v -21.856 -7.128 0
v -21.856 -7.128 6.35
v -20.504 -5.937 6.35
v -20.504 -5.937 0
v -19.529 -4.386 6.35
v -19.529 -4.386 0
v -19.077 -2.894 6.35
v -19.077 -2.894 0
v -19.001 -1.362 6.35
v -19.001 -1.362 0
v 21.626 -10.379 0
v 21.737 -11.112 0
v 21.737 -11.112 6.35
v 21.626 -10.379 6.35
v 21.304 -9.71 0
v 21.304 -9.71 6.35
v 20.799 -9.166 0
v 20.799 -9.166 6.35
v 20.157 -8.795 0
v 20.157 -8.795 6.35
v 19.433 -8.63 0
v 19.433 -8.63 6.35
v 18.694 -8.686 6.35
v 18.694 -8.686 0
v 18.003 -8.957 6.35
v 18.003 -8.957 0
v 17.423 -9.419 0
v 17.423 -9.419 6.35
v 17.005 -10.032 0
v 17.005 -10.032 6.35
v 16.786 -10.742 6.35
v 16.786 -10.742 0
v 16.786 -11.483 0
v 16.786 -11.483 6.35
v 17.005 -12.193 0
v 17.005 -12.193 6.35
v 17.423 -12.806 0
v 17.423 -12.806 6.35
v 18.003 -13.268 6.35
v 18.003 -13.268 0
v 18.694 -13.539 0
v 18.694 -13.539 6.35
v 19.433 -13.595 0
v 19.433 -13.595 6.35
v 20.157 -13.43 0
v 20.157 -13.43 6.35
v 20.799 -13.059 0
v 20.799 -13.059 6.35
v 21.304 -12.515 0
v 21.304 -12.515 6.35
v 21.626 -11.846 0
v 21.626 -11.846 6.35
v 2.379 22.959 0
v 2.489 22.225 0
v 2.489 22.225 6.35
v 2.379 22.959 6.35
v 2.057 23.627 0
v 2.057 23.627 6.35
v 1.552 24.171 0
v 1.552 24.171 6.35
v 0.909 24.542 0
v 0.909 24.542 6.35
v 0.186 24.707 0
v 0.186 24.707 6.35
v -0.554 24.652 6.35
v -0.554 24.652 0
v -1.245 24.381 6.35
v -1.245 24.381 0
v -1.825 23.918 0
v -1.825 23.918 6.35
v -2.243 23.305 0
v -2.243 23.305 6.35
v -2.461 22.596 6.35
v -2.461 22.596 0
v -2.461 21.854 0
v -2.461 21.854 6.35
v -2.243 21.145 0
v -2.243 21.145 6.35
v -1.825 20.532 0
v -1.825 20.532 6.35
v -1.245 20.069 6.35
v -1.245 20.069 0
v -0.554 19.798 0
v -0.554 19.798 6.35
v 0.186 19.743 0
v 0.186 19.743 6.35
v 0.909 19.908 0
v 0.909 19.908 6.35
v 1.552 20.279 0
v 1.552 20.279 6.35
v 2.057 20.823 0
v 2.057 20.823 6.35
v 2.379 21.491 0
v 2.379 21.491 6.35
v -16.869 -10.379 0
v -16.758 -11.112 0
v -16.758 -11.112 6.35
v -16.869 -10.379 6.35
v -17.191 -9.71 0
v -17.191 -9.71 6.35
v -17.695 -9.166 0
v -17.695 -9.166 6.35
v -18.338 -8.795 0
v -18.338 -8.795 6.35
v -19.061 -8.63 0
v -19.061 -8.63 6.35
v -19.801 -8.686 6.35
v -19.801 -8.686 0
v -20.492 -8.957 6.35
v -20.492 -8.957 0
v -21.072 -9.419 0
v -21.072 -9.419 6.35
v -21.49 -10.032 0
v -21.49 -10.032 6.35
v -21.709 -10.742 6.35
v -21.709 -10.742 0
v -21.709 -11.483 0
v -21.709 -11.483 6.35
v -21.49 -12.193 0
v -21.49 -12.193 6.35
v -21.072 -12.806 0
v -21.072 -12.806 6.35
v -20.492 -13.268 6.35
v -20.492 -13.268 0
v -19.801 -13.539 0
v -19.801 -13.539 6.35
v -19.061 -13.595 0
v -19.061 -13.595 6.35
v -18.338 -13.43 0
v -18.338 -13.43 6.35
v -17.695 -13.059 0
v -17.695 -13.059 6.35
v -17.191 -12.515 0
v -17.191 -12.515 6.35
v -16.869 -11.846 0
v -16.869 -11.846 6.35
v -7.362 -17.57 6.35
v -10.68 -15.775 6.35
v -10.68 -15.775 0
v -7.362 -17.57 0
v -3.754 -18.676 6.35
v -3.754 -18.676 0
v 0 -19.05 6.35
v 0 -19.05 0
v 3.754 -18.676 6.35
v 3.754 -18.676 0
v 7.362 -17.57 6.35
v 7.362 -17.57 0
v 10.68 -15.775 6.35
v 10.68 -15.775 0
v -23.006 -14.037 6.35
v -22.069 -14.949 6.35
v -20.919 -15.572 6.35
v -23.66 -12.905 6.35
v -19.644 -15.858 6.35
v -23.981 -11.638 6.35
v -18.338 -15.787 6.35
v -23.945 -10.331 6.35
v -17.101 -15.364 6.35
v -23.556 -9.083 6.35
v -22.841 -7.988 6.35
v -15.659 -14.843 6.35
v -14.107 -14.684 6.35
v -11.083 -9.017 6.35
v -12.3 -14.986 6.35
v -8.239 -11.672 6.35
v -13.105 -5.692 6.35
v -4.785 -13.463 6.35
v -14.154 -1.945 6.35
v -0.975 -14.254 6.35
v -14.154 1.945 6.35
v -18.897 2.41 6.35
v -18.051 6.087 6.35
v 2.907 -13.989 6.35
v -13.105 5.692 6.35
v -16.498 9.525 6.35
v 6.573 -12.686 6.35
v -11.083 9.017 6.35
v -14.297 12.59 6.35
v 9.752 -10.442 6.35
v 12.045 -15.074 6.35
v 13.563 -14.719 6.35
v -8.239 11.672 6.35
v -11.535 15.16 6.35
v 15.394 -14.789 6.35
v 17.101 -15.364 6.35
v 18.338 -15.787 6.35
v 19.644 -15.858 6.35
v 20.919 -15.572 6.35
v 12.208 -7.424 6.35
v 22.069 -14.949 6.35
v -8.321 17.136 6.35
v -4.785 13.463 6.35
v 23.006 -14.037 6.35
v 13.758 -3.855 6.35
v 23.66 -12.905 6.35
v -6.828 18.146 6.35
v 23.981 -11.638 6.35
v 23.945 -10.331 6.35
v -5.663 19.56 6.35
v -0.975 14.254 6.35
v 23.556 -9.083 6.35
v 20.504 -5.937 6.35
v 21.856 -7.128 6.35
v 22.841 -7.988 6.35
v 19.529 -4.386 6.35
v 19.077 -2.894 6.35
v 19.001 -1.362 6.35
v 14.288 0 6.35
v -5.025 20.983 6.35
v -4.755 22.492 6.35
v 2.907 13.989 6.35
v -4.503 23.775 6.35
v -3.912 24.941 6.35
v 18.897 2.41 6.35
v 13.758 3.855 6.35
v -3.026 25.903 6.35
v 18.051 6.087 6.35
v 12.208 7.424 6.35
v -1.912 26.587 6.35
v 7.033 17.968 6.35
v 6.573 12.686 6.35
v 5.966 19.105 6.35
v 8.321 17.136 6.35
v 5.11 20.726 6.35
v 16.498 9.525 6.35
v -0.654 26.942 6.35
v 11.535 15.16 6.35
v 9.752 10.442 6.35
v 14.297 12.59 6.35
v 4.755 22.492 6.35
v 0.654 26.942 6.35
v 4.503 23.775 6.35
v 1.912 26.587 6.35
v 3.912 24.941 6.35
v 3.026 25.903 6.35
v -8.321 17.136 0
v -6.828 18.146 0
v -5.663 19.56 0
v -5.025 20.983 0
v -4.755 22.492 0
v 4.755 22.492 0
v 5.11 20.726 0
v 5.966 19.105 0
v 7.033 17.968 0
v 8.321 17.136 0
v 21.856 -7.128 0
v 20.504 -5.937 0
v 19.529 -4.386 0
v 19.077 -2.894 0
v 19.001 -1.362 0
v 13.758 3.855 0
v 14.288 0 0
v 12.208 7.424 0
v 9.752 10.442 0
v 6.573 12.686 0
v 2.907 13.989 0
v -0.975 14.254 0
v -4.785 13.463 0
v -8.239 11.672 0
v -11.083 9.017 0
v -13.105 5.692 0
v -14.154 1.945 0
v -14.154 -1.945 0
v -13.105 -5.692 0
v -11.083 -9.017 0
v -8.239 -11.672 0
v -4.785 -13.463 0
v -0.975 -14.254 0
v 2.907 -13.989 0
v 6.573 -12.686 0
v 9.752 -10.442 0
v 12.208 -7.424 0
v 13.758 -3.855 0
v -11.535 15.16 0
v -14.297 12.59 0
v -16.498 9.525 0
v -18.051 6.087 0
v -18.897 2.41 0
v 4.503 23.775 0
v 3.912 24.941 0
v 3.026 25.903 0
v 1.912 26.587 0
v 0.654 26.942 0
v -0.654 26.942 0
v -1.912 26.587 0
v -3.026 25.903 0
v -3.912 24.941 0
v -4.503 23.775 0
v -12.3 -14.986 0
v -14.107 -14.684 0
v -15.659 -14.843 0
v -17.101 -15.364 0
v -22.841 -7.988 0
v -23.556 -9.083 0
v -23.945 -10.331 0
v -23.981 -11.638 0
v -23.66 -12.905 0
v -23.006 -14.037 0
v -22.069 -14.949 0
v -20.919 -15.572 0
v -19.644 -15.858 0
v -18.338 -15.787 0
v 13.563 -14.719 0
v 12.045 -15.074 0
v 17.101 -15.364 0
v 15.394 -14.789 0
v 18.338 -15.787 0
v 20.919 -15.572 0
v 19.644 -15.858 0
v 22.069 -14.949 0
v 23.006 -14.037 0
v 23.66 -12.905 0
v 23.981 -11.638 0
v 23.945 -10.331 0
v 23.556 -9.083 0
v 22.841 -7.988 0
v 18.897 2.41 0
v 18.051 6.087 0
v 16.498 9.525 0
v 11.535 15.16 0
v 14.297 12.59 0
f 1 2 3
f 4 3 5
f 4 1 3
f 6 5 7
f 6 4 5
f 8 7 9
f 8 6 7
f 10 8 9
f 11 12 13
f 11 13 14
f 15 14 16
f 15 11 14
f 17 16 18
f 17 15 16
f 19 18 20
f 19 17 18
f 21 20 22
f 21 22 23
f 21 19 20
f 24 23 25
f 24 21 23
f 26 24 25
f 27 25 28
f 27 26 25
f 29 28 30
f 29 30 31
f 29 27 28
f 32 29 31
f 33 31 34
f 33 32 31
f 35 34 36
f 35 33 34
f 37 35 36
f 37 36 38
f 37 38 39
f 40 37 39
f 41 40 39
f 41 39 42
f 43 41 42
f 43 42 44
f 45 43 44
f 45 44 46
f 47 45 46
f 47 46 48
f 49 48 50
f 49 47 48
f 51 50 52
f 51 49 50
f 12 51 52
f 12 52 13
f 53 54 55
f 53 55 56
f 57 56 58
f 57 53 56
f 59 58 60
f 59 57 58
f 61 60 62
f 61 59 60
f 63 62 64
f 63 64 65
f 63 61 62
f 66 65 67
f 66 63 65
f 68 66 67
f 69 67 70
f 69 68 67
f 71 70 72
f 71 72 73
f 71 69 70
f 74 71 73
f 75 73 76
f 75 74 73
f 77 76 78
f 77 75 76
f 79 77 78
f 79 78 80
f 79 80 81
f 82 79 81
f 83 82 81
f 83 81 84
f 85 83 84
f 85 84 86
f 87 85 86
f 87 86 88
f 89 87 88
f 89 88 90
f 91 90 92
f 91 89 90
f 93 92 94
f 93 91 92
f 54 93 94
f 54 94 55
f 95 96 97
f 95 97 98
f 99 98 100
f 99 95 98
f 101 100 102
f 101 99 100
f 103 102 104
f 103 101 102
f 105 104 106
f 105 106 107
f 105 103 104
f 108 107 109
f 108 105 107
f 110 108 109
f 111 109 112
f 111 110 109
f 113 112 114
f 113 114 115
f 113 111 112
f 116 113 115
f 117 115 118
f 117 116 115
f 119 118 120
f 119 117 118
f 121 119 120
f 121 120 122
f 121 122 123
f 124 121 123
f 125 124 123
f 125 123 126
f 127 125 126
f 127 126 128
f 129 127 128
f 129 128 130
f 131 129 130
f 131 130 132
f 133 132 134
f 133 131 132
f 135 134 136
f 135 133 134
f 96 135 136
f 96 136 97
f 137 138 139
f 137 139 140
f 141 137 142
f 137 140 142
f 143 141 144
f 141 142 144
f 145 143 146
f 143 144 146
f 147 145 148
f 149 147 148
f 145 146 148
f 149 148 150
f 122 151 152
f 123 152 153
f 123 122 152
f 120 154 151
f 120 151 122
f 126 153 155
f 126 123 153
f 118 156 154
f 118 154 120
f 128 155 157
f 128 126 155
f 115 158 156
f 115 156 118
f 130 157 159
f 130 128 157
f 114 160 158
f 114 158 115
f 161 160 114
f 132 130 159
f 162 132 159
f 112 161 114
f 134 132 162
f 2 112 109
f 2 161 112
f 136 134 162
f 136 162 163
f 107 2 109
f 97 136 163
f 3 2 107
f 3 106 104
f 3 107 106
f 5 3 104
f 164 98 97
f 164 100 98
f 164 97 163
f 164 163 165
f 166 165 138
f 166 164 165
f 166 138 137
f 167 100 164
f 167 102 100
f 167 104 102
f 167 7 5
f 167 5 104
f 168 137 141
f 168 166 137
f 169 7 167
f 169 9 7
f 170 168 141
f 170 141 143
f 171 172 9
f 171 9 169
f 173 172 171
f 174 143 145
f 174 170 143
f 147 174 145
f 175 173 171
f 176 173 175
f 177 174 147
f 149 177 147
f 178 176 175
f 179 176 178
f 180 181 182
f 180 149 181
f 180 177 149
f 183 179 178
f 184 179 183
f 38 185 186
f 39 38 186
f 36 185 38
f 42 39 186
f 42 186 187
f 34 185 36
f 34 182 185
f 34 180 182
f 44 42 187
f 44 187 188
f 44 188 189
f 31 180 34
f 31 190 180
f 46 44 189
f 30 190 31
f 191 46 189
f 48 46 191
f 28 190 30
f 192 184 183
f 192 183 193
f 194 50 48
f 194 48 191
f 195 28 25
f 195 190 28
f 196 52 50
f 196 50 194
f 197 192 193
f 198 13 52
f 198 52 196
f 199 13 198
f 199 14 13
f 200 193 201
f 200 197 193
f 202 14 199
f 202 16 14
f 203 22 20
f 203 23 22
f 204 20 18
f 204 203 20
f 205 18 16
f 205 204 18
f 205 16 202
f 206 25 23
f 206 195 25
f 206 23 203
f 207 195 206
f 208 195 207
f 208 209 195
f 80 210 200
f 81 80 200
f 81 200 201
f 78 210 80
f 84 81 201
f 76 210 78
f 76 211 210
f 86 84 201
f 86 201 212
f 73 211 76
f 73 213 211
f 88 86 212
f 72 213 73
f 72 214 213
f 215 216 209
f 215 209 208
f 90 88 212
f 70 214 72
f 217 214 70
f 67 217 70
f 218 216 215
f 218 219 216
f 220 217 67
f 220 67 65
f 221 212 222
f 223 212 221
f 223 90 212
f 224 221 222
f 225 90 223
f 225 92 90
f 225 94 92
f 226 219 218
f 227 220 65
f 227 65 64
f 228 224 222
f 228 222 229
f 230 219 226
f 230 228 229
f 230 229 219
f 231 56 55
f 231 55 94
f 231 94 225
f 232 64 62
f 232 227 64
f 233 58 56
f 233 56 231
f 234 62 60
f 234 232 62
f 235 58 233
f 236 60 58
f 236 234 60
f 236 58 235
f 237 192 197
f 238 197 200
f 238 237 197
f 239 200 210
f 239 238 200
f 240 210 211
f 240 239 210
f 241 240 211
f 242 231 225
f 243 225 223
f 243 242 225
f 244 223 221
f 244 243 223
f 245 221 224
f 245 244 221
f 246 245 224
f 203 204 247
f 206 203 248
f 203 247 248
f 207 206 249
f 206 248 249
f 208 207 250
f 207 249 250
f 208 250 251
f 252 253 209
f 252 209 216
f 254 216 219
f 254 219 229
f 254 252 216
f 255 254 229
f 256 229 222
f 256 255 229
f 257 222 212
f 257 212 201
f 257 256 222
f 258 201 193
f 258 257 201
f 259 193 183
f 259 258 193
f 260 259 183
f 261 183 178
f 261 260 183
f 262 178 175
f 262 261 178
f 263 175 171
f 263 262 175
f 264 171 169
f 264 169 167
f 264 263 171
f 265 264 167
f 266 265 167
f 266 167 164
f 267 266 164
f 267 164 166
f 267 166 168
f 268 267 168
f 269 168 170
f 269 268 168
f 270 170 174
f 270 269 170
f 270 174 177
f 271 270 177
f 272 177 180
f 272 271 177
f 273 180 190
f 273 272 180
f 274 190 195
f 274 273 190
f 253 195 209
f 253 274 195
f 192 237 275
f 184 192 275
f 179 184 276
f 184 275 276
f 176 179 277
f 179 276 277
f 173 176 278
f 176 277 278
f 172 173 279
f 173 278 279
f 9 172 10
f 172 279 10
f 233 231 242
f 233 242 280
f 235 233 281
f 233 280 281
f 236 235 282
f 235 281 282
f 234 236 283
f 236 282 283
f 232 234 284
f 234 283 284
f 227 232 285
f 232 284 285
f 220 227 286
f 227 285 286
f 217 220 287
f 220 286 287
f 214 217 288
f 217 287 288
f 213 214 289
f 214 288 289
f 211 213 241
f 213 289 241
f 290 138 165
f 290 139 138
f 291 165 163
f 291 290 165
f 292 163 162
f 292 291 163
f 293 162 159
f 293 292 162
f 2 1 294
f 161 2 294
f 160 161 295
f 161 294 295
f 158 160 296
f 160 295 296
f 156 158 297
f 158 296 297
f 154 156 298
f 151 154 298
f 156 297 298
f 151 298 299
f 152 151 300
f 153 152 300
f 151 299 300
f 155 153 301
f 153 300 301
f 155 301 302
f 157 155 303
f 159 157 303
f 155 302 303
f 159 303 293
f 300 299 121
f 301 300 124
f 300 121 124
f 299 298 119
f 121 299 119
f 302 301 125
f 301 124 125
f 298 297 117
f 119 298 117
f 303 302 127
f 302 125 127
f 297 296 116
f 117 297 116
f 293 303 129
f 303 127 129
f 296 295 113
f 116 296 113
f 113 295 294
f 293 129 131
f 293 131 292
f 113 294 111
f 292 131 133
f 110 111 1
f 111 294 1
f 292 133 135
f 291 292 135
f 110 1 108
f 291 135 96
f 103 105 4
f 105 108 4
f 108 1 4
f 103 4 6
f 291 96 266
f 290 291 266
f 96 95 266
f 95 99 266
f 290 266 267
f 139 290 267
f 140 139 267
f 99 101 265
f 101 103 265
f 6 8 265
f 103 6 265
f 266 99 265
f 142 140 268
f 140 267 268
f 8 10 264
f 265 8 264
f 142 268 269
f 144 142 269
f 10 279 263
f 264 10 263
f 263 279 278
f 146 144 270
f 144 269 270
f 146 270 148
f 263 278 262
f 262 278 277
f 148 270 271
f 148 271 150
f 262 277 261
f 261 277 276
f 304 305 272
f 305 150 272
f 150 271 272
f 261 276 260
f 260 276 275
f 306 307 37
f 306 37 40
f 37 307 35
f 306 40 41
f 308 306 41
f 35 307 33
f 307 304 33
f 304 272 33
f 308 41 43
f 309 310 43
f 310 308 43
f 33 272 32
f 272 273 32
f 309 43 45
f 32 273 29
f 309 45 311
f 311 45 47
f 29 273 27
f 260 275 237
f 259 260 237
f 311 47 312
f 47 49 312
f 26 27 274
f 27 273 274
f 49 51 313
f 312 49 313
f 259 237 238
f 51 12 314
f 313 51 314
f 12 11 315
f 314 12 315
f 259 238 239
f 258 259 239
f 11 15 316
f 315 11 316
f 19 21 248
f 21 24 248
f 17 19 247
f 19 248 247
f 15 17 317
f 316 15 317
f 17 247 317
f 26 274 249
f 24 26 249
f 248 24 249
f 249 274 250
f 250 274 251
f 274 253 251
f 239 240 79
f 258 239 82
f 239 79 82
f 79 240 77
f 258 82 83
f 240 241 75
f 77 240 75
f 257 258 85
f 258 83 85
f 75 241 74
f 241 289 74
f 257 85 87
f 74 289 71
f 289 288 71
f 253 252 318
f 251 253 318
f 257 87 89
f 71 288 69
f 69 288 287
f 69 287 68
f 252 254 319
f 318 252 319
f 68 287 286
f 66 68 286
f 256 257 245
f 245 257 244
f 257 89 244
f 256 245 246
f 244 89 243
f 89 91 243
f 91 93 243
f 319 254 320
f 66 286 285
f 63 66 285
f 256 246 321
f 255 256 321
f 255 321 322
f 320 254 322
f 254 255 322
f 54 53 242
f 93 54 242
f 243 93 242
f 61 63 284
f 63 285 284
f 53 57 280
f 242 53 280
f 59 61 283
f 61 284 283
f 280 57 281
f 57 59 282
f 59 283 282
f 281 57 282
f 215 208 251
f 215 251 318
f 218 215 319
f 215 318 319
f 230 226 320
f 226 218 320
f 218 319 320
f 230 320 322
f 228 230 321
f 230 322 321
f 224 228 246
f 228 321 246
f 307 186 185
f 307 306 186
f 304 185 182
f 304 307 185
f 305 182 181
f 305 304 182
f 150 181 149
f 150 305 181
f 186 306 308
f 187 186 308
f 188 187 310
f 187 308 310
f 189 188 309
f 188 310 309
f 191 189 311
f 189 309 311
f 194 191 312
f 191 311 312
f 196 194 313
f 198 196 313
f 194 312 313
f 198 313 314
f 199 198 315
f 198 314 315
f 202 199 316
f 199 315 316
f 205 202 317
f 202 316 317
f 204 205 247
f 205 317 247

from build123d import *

# Parameters (mm, degrees)
SKETCH2_R           = 4.7625
SKETCH2_R_2         = 2.4892
SKETCH2_R_3         = 19.05
SKETCH2_R_4         = 14.2875
BOSS_EXTRUDE1_DEPTH = 6.35
FILLET2_R           = 6.35


with BuildPart() as part:
    # Sketch2 → Boss-Extrude1 (new body)
    # profile 1 of 4: a face of its own
    with BuildSketch(Plane.XY):
        with Locations((19.247414599, -11.1125)):
            Circle(SKETCH2_R)
        with Locations((19.247414599, -11.1125)):
            Circle(SKETCH2_R_2, mode=Mode.SUBTRACT)
    # profile 2 of 4: a face of its own
    with BuildSketch(Plane.XY):
        Circle(SKETCH2_R_3)
        Circle(SKETCH2_R_4, mode=Mode.SUBTRACT)
    # profile 3 of 4: a face of its own
    with BuildSketch(Plane.XY):
        with Locations((0, 22.225)):
            Circle(SKETCH2_R)
        with Locations((0, 22.225)):
            Circle(SKETCH2_R_2, mode=Mode.SUBTRACT)
    # profile 4 of 4: a face of its own
    with BuildSketch(Plane.XY):
        with Locations((-19.247414599, -11.1125)):
            Circle(SKETCH2_R)
        with Locations((-19.247414599, -11.1125)):
            Circle(SKETCH2_R_2, mode=Mode.SUBTRACT)
    extrude(amount=BOSS_EXTRUDE1_DEPTH)

    # Fillet2
    fillet2_edges = [part.edges().sort_by_distance(p)[0] for p in [
        (-17.88937524, -6.547728883, 3.175),
        (-3.27418807, 18.766517857, 3.175),
        (3.27418807, 18.766517857, 3.175),
        (17.88937524, -6.547728883, 3.175),
        (14.61518717, -12.218788974, 3.175),
        (-14.61518717, -12.218788974, 3.175),
    ]]
    fillet(fillet2_edges, radius=FILLET2_R)


solid = part.part
